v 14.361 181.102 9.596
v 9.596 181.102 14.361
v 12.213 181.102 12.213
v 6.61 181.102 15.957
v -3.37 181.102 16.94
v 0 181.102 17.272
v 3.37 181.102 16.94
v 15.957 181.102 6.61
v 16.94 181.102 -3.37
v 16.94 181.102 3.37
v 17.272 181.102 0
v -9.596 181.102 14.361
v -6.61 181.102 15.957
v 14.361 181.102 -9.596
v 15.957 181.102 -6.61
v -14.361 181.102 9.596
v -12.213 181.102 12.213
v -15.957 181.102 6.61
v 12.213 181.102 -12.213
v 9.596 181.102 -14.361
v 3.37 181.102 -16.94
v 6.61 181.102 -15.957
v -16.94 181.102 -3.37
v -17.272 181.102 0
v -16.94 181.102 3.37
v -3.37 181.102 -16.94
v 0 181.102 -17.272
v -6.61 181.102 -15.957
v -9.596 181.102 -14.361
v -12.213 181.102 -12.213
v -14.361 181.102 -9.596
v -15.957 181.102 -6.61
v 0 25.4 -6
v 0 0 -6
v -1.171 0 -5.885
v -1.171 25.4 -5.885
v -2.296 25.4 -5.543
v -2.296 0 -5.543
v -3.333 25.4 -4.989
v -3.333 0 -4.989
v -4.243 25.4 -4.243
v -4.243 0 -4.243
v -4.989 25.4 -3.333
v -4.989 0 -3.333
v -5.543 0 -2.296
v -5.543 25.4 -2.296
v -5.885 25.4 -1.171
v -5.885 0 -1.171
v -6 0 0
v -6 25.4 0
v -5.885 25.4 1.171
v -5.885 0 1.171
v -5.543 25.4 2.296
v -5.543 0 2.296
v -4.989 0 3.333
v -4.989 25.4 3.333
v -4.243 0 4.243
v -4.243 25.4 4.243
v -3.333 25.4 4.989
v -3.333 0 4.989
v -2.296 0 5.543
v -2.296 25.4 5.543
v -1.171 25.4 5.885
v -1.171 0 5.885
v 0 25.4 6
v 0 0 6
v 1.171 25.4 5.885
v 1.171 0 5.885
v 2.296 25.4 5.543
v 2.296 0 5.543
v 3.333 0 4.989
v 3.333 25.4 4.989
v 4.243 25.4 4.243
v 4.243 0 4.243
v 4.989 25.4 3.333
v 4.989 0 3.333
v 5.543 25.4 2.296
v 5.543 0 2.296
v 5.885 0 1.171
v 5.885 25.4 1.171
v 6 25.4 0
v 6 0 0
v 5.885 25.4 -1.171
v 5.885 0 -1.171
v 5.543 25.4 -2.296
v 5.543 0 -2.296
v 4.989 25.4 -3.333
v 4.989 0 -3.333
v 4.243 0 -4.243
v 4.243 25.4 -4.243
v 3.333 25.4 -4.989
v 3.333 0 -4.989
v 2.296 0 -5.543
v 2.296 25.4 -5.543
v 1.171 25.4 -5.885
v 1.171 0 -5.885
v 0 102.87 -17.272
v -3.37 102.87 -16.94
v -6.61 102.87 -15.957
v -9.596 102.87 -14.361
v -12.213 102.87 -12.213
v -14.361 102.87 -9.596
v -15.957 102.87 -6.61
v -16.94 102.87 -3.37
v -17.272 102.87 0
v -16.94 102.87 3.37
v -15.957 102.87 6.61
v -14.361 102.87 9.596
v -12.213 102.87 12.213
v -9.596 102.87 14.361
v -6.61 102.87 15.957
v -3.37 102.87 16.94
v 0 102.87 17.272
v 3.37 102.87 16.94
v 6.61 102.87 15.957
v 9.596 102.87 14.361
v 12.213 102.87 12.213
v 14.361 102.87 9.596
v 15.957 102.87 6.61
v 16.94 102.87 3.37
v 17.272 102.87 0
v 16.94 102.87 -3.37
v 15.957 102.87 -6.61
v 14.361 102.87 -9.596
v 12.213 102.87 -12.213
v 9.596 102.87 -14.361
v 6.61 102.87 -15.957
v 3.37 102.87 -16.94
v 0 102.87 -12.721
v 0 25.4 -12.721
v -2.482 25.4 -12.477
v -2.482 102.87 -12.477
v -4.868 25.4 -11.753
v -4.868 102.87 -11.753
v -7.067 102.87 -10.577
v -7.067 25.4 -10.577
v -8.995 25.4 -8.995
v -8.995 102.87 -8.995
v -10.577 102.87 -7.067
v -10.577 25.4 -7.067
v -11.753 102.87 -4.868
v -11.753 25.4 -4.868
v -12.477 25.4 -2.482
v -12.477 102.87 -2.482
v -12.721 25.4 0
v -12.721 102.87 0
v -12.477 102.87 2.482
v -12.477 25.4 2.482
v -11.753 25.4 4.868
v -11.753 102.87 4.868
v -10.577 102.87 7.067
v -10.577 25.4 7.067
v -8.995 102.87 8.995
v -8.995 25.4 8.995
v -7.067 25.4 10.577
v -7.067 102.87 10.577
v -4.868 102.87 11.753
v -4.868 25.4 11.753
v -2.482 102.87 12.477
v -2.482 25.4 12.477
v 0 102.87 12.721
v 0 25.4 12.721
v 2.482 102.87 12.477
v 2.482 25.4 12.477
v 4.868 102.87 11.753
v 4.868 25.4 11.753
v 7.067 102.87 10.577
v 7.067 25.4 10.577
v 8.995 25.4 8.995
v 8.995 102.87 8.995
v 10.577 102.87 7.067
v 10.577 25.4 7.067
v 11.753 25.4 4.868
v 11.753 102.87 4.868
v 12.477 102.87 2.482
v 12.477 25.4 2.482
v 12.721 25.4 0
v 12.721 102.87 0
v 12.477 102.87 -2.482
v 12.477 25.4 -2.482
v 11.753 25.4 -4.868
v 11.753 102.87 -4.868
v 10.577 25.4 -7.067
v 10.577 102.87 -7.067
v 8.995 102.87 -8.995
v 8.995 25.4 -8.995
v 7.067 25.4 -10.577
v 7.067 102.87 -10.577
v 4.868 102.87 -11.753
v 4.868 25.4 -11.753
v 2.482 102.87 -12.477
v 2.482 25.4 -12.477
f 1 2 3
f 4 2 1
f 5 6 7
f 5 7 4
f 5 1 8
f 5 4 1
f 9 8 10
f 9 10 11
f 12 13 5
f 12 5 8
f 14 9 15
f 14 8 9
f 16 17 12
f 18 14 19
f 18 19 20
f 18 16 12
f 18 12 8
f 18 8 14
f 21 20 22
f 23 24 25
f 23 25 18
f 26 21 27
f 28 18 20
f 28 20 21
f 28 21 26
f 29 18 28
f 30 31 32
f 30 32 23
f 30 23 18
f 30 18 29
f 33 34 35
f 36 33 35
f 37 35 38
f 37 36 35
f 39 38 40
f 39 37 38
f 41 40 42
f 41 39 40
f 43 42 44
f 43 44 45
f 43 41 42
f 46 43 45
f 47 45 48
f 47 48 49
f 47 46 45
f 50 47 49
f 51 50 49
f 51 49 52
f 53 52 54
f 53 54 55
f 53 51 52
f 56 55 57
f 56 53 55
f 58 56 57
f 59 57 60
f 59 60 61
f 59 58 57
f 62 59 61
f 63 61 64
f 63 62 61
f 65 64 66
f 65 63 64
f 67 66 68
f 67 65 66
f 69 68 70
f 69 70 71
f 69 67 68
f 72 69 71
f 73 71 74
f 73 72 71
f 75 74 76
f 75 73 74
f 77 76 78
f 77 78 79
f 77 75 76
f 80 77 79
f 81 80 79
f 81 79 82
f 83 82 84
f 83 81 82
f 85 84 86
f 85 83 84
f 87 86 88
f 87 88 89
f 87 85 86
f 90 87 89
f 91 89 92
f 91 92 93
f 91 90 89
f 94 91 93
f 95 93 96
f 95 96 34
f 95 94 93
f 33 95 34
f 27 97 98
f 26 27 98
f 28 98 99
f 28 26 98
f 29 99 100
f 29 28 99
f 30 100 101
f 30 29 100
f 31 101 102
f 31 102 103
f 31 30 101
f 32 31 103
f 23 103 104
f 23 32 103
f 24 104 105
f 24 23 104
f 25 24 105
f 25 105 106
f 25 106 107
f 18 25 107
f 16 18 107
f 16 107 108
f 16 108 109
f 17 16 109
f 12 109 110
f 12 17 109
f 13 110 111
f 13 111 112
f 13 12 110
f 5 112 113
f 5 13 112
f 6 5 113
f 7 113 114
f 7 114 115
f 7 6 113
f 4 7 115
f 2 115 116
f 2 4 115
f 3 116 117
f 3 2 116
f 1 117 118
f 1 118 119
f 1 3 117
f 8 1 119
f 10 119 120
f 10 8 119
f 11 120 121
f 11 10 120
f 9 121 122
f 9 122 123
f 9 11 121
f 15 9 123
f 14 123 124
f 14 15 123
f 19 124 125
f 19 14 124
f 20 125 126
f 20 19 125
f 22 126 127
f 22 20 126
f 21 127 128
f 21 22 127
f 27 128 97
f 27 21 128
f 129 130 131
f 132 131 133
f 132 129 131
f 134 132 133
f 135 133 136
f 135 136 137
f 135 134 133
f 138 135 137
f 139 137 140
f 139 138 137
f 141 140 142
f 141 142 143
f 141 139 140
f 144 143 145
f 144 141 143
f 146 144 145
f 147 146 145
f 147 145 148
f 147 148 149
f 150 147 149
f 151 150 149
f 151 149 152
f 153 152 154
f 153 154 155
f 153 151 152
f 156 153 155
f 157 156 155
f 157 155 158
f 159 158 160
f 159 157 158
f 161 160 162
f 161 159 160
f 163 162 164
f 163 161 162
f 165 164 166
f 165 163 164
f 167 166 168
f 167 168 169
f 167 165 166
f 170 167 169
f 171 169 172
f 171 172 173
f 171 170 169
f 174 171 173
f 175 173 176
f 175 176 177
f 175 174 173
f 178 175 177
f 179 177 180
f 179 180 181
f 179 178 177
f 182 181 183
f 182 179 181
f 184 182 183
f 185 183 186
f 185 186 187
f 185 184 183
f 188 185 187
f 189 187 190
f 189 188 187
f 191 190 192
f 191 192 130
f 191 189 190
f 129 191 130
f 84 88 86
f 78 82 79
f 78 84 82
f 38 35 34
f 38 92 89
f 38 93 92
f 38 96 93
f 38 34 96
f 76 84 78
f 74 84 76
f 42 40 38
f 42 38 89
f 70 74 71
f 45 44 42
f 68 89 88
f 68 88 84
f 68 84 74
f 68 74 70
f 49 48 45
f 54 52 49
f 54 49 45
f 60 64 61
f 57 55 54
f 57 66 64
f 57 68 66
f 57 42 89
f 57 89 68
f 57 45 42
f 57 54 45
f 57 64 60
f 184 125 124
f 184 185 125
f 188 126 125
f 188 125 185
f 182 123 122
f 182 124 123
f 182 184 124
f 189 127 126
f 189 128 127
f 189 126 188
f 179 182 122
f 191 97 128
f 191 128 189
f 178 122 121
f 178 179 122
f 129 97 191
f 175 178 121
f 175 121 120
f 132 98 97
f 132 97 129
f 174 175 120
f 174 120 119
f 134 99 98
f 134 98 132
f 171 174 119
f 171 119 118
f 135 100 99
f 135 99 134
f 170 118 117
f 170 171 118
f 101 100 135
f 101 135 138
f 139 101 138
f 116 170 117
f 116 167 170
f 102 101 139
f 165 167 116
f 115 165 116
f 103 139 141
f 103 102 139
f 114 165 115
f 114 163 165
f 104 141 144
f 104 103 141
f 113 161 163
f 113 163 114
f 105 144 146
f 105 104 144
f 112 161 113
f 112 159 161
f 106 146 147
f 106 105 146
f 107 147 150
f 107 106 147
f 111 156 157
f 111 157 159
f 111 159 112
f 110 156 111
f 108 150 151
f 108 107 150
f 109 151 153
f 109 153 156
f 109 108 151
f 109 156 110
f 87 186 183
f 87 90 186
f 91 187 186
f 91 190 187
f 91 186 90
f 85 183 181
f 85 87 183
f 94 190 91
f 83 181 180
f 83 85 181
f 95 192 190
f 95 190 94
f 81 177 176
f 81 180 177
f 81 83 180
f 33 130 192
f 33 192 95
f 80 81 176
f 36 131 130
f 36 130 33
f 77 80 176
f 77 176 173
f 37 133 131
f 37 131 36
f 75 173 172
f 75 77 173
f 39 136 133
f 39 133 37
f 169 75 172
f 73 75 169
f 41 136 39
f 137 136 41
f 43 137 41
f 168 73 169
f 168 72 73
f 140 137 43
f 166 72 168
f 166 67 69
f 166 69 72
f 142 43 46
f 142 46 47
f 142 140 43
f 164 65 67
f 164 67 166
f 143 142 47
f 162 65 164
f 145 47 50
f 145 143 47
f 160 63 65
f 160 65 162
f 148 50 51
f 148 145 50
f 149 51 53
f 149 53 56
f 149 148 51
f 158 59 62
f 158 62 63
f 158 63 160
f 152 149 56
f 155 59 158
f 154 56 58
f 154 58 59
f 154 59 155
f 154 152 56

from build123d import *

# Parameters (mm, degrees)
SKETCH2_W   = 12.720955
SKETCH2_H   = 33.02
SKETCH2_W_2 = 5.999999938
SKETCH2_H_2 = 25.4


with BuildPart() as part:
    # Sketch2 → Revolve1 (revolve)
    with BuildSketch(Plane.XY, mode=Mode.PRIVATE) as revolve1_sk:
        with Locations((6.3604775, 86.36)):
            Rectangle(SKETCH2_W, SKETCH2_H)
        Polygon((0, 181.102), (0, 102.87), (12.720955, 102.87), (17.272, 102.87), (17.272, 181.102), align=None)
        Polygon((0, 69.85), (0, 25.4), (5.999999938, 25.4), (12.720955, 25.4), (12.720955, 69.85), align=None)
        with Locations((2.999999969, 12.7)):
            Rectangle(SKETCH2_W_2, SKETCH2_H_2)
    revolve(revolve1_sk.sketch.rotate(Axis((0, 0, 0), (0, 1, 0)), 90), axis=Axis((0, 0, 0), (0, 1, 0)))


solid = part.part
